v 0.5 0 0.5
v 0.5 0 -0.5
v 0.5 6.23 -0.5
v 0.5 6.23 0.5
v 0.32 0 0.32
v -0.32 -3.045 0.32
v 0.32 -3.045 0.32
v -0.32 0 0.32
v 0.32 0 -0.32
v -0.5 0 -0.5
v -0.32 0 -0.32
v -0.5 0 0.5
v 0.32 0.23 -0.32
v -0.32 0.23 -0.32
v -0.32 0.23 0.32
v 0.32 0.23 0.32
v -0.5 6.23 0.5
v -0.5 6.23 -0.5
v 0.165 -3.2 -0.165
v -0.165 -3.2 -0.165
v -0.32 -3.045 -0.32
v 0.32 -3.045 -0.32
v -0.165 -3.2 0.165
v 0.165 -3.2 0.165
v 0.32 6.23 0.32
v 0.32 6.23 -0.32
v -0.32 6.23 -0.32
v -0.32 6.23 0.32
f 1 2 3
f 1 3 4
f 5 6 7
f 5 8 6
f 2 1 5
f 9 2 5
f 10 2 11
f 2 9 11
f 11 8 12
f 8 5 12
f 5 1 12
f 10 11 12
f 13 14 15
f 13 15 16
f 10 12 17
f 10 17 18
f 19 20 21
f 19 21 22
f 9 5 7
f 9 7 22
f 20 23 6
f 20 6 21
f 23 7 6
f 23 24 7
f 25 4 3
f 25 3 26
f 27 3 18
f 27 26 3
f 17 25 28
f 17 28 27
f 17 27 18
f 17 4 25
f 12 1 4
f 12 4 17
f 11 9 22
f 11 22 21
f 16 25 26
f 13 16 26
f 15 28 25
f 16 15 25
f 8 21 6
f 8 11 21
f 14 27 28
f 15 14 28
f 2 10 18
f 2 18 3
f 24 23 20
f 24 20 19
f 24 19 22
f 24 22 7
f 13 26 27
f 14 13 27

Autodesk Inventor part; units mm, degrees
ref_plane "YZ Plane" through (0, 0, 0) normal (1, 0, 0) x (0, 1, 0)
ref_plane "XZ Plane" through (0, 0, 0) normal (0, 1, 0) x (-1, 0, 0)
ref_plane "XY Plane" through (0, 0, 0) normal (0, 0, 1) x (1, 0, 0)
sketch "Sketch1" plane through (0, 0, 0) normal (0, 1, 0) x (-1, 0, 0)
  line L0 (-0.5, 0.5) -> (0.5, 0.5)
  line L1 (0.5, 0.5) -> (0.5, -0.5)
  line L2 (0.5, -0.5) -> (-0.5, -0.5)
  line L3 (-0.5, -0.5) -> (-0.5, 0.5)
  line L4 (-0.5, 0.5) -> (0.5, -0.5) construction
  line L5 (0.5, 0.5) -> (-0.5, -0.5) construction
  point P0 (0, 0)
  dimension "d0" = 1
  dimension "d1" = 1
extrude "Extrusion1" add sketch "Sketch1" along normal blind 6.23
sketch "Sketch2" plane through (0, 0, 0) normal (0, -1, 0) x (1, 0, 0)
  line L0 (-0.32, 0.32) -> (0.32, 0.32)
  line L1 (0.32, 0.32) -> (0.32, -0.32)
  line L2 (0.32, -0.32) -> (-0.32, -0.32)
  line L3 (-0.32, -0.32) -> (-0.32, 0.32)
  line L4 (-0.32, 0.32) -> (0.32, -0.32) construction
  line L5 (0.32, 0.32) -> (-0.32, -0.32) construction
  point P0 (0, 0)
  dimension "d4" = 0.64
  dimension "d5" = 0.64
extrude "Extrusion2" add sketch "Sketch2" along normal blind 3.2
chamfer "Chamfer1" distance 0.155 angle 45 4 edges at (0, -3.2, 0.32) (0.32, -3.2, 0) (0, -3.2, -0.32) (-0.32, -3.2, 0)
sketch "Sketch3" plane through (0, 6.23, 0) normal (0, 1, 0) x (1, 0, 0)
  line L0 (0.32, 0.32) -> (-0.32, 0.32)
  line L1 (-0.32, 0.32) -> (-0.32, -0.32)
  line L2 (-0.32, -0.32) -> (0.32, -0.32)
  line L3 (0.32, -0.32) -> (0.32, 0.32)
  line L4 (0.32, 0.32) -> (-0.32, -0.32) construction
  line L5 (-0.32, 0.32) -> (0.32, -0.32) construction
  point P0 (0, 0)
  dimension "d11" = 0.64
  dimension "d12" = 0.64
extrude "Extrusion3" cut sketch "Sketch3" against normal blind 6
properties part number "pin" material "Gold"
